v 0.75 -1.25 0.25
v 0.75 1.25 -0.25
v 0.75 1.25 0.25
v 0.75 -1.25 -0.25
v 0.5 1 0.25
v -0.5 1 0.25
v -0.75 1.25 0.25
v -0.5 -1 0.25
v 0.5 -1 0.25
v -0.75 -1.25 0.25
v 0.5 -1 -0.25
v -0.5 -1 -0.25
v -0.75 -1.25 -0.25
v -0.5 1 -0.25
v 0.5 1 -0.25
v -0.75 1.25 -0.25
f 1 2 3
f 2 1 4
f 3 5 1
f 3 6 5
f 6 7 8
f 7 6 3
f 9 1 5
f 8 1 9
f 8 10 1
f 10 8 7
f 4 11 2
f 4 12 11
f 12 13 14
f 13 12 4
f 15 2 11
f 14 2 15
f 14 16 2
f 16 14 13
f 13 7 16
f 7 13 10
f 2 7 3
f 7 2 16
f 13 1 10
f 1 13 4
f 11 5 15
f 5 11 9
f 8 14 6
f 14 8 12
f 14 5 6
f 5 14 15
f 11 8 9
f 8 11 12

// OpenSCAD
difference () {
    cube([1.5, 2.5, 0.5], center=true);
    cube([1.0, 2.0, 0.5], center=true);
}
